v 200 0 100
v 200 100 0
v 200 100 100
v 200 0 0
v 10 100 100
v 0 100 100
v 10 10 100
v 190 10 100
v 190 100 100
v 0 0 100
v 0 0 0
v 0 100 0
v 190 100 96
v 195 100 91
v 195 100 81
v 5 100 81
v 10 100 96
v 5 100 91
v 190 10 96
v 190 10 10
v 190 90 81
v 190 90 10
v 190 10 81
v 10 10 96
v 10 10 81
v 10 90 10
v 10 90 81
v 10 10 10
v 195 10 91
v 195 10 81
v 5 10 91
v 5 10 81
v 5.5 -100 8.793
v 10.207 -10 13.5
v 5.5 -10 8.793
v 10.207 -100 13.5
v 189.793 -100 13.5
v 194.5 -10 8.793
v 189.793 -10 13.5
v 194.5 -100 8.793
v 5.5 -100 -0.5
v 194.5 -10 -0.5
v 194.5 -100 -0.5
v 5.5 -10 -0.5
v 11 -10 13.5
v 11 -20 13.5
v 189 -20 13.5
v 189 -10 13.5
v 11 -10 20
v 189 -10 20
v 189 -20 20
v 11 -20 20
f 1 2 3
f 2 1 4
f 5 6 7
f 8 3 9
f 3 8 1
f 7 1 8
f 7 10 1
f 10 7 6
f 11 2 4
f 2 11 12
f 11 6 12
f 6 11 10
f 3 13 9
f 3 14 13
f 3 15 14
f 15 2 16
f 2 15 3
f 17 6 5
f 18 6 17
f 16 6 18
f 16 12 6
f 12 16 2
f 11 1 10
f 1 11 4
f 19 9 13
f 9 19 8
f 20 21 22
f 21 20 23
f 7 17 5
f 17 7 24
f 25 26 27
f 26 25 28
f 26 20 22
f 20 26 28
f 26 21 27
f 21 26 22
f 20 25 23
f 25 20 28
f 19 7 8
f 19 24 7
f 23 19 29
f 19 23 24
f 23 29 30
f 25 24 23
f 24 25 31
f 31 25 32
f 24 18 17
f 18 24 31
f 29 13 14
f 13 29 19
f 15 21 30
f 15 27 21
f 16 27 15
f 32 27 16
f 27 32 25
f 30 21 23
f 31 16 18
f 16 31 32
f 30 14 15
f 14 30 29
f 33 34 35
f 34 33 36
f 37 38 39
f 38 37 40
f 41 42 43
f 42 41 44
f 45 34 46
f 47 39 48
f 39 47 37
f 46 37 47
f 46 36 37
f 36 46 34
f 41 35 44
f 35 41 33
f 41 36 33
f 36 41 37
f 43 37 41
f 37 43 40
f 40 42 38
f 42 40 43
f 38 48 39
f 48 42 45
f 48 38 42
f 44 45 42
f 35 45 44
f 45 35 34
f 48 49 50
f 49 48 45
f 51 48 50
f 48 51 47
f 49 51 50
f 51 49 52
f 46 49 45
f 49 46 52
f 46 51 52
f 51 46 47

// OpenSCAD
part = "both"; // [box:box only,lid:Lid Only,both:box and lid]
height = 100;
width = 200;
length = 100;
wall = 10;
tolerance = .5; // .5 for normal fit



make_part();
module make_part()
{
    if (part == "box")
    {
        box();
    }else if (part == "lid")
    {
        lid();
    }else
    {
        box();
        lid();
    }
}
    

//making the box
module box()
{
    difference()
    {
        lid =[[height - 2*(wall), wall/2], [height-wall, wall/2], [height-wall/2, wall], [height-wall/2, width -  wall], [height-wall, width-wall/2], [height - 2* wall, width - wall/2]  ];
        cube(size = [width, length, height]);
        translate([wall, 2* wall, height- wall]) cube(size = [width - 2*wall, length - 2*wall,  wall]);
        translate([wall, wall, wall]) cube(size = [width - 2*wall, length - 2*wall, height - wall]); 
        translate([width,length+1,0+1]) rotate([0,270,90]) linear_extrude(length+1 - wall) polygon(lid);
    }
}

//making the lid
module lid()
{
    union()
    {
        lid =[[height - 2*(wall), wall/2], [height-wall, wall/2], [height-wall/2, wall], [height-wall/2, width -  wall], [height-wall, width-wall/2], [height - 2* wall, width - wall/2]  ];
        translate([width,-wall ,-height +2* wall-1]) rotate([0,270,90])  linear_extrude(length - wall)  
        
        offset(r = -tolerance) 
        {
           polygon(lid);
        }
        translate([wall+1 , -2*wall  , ])cube(size = [width-2*wall-2, wall , 2*wall]);
    }
}
